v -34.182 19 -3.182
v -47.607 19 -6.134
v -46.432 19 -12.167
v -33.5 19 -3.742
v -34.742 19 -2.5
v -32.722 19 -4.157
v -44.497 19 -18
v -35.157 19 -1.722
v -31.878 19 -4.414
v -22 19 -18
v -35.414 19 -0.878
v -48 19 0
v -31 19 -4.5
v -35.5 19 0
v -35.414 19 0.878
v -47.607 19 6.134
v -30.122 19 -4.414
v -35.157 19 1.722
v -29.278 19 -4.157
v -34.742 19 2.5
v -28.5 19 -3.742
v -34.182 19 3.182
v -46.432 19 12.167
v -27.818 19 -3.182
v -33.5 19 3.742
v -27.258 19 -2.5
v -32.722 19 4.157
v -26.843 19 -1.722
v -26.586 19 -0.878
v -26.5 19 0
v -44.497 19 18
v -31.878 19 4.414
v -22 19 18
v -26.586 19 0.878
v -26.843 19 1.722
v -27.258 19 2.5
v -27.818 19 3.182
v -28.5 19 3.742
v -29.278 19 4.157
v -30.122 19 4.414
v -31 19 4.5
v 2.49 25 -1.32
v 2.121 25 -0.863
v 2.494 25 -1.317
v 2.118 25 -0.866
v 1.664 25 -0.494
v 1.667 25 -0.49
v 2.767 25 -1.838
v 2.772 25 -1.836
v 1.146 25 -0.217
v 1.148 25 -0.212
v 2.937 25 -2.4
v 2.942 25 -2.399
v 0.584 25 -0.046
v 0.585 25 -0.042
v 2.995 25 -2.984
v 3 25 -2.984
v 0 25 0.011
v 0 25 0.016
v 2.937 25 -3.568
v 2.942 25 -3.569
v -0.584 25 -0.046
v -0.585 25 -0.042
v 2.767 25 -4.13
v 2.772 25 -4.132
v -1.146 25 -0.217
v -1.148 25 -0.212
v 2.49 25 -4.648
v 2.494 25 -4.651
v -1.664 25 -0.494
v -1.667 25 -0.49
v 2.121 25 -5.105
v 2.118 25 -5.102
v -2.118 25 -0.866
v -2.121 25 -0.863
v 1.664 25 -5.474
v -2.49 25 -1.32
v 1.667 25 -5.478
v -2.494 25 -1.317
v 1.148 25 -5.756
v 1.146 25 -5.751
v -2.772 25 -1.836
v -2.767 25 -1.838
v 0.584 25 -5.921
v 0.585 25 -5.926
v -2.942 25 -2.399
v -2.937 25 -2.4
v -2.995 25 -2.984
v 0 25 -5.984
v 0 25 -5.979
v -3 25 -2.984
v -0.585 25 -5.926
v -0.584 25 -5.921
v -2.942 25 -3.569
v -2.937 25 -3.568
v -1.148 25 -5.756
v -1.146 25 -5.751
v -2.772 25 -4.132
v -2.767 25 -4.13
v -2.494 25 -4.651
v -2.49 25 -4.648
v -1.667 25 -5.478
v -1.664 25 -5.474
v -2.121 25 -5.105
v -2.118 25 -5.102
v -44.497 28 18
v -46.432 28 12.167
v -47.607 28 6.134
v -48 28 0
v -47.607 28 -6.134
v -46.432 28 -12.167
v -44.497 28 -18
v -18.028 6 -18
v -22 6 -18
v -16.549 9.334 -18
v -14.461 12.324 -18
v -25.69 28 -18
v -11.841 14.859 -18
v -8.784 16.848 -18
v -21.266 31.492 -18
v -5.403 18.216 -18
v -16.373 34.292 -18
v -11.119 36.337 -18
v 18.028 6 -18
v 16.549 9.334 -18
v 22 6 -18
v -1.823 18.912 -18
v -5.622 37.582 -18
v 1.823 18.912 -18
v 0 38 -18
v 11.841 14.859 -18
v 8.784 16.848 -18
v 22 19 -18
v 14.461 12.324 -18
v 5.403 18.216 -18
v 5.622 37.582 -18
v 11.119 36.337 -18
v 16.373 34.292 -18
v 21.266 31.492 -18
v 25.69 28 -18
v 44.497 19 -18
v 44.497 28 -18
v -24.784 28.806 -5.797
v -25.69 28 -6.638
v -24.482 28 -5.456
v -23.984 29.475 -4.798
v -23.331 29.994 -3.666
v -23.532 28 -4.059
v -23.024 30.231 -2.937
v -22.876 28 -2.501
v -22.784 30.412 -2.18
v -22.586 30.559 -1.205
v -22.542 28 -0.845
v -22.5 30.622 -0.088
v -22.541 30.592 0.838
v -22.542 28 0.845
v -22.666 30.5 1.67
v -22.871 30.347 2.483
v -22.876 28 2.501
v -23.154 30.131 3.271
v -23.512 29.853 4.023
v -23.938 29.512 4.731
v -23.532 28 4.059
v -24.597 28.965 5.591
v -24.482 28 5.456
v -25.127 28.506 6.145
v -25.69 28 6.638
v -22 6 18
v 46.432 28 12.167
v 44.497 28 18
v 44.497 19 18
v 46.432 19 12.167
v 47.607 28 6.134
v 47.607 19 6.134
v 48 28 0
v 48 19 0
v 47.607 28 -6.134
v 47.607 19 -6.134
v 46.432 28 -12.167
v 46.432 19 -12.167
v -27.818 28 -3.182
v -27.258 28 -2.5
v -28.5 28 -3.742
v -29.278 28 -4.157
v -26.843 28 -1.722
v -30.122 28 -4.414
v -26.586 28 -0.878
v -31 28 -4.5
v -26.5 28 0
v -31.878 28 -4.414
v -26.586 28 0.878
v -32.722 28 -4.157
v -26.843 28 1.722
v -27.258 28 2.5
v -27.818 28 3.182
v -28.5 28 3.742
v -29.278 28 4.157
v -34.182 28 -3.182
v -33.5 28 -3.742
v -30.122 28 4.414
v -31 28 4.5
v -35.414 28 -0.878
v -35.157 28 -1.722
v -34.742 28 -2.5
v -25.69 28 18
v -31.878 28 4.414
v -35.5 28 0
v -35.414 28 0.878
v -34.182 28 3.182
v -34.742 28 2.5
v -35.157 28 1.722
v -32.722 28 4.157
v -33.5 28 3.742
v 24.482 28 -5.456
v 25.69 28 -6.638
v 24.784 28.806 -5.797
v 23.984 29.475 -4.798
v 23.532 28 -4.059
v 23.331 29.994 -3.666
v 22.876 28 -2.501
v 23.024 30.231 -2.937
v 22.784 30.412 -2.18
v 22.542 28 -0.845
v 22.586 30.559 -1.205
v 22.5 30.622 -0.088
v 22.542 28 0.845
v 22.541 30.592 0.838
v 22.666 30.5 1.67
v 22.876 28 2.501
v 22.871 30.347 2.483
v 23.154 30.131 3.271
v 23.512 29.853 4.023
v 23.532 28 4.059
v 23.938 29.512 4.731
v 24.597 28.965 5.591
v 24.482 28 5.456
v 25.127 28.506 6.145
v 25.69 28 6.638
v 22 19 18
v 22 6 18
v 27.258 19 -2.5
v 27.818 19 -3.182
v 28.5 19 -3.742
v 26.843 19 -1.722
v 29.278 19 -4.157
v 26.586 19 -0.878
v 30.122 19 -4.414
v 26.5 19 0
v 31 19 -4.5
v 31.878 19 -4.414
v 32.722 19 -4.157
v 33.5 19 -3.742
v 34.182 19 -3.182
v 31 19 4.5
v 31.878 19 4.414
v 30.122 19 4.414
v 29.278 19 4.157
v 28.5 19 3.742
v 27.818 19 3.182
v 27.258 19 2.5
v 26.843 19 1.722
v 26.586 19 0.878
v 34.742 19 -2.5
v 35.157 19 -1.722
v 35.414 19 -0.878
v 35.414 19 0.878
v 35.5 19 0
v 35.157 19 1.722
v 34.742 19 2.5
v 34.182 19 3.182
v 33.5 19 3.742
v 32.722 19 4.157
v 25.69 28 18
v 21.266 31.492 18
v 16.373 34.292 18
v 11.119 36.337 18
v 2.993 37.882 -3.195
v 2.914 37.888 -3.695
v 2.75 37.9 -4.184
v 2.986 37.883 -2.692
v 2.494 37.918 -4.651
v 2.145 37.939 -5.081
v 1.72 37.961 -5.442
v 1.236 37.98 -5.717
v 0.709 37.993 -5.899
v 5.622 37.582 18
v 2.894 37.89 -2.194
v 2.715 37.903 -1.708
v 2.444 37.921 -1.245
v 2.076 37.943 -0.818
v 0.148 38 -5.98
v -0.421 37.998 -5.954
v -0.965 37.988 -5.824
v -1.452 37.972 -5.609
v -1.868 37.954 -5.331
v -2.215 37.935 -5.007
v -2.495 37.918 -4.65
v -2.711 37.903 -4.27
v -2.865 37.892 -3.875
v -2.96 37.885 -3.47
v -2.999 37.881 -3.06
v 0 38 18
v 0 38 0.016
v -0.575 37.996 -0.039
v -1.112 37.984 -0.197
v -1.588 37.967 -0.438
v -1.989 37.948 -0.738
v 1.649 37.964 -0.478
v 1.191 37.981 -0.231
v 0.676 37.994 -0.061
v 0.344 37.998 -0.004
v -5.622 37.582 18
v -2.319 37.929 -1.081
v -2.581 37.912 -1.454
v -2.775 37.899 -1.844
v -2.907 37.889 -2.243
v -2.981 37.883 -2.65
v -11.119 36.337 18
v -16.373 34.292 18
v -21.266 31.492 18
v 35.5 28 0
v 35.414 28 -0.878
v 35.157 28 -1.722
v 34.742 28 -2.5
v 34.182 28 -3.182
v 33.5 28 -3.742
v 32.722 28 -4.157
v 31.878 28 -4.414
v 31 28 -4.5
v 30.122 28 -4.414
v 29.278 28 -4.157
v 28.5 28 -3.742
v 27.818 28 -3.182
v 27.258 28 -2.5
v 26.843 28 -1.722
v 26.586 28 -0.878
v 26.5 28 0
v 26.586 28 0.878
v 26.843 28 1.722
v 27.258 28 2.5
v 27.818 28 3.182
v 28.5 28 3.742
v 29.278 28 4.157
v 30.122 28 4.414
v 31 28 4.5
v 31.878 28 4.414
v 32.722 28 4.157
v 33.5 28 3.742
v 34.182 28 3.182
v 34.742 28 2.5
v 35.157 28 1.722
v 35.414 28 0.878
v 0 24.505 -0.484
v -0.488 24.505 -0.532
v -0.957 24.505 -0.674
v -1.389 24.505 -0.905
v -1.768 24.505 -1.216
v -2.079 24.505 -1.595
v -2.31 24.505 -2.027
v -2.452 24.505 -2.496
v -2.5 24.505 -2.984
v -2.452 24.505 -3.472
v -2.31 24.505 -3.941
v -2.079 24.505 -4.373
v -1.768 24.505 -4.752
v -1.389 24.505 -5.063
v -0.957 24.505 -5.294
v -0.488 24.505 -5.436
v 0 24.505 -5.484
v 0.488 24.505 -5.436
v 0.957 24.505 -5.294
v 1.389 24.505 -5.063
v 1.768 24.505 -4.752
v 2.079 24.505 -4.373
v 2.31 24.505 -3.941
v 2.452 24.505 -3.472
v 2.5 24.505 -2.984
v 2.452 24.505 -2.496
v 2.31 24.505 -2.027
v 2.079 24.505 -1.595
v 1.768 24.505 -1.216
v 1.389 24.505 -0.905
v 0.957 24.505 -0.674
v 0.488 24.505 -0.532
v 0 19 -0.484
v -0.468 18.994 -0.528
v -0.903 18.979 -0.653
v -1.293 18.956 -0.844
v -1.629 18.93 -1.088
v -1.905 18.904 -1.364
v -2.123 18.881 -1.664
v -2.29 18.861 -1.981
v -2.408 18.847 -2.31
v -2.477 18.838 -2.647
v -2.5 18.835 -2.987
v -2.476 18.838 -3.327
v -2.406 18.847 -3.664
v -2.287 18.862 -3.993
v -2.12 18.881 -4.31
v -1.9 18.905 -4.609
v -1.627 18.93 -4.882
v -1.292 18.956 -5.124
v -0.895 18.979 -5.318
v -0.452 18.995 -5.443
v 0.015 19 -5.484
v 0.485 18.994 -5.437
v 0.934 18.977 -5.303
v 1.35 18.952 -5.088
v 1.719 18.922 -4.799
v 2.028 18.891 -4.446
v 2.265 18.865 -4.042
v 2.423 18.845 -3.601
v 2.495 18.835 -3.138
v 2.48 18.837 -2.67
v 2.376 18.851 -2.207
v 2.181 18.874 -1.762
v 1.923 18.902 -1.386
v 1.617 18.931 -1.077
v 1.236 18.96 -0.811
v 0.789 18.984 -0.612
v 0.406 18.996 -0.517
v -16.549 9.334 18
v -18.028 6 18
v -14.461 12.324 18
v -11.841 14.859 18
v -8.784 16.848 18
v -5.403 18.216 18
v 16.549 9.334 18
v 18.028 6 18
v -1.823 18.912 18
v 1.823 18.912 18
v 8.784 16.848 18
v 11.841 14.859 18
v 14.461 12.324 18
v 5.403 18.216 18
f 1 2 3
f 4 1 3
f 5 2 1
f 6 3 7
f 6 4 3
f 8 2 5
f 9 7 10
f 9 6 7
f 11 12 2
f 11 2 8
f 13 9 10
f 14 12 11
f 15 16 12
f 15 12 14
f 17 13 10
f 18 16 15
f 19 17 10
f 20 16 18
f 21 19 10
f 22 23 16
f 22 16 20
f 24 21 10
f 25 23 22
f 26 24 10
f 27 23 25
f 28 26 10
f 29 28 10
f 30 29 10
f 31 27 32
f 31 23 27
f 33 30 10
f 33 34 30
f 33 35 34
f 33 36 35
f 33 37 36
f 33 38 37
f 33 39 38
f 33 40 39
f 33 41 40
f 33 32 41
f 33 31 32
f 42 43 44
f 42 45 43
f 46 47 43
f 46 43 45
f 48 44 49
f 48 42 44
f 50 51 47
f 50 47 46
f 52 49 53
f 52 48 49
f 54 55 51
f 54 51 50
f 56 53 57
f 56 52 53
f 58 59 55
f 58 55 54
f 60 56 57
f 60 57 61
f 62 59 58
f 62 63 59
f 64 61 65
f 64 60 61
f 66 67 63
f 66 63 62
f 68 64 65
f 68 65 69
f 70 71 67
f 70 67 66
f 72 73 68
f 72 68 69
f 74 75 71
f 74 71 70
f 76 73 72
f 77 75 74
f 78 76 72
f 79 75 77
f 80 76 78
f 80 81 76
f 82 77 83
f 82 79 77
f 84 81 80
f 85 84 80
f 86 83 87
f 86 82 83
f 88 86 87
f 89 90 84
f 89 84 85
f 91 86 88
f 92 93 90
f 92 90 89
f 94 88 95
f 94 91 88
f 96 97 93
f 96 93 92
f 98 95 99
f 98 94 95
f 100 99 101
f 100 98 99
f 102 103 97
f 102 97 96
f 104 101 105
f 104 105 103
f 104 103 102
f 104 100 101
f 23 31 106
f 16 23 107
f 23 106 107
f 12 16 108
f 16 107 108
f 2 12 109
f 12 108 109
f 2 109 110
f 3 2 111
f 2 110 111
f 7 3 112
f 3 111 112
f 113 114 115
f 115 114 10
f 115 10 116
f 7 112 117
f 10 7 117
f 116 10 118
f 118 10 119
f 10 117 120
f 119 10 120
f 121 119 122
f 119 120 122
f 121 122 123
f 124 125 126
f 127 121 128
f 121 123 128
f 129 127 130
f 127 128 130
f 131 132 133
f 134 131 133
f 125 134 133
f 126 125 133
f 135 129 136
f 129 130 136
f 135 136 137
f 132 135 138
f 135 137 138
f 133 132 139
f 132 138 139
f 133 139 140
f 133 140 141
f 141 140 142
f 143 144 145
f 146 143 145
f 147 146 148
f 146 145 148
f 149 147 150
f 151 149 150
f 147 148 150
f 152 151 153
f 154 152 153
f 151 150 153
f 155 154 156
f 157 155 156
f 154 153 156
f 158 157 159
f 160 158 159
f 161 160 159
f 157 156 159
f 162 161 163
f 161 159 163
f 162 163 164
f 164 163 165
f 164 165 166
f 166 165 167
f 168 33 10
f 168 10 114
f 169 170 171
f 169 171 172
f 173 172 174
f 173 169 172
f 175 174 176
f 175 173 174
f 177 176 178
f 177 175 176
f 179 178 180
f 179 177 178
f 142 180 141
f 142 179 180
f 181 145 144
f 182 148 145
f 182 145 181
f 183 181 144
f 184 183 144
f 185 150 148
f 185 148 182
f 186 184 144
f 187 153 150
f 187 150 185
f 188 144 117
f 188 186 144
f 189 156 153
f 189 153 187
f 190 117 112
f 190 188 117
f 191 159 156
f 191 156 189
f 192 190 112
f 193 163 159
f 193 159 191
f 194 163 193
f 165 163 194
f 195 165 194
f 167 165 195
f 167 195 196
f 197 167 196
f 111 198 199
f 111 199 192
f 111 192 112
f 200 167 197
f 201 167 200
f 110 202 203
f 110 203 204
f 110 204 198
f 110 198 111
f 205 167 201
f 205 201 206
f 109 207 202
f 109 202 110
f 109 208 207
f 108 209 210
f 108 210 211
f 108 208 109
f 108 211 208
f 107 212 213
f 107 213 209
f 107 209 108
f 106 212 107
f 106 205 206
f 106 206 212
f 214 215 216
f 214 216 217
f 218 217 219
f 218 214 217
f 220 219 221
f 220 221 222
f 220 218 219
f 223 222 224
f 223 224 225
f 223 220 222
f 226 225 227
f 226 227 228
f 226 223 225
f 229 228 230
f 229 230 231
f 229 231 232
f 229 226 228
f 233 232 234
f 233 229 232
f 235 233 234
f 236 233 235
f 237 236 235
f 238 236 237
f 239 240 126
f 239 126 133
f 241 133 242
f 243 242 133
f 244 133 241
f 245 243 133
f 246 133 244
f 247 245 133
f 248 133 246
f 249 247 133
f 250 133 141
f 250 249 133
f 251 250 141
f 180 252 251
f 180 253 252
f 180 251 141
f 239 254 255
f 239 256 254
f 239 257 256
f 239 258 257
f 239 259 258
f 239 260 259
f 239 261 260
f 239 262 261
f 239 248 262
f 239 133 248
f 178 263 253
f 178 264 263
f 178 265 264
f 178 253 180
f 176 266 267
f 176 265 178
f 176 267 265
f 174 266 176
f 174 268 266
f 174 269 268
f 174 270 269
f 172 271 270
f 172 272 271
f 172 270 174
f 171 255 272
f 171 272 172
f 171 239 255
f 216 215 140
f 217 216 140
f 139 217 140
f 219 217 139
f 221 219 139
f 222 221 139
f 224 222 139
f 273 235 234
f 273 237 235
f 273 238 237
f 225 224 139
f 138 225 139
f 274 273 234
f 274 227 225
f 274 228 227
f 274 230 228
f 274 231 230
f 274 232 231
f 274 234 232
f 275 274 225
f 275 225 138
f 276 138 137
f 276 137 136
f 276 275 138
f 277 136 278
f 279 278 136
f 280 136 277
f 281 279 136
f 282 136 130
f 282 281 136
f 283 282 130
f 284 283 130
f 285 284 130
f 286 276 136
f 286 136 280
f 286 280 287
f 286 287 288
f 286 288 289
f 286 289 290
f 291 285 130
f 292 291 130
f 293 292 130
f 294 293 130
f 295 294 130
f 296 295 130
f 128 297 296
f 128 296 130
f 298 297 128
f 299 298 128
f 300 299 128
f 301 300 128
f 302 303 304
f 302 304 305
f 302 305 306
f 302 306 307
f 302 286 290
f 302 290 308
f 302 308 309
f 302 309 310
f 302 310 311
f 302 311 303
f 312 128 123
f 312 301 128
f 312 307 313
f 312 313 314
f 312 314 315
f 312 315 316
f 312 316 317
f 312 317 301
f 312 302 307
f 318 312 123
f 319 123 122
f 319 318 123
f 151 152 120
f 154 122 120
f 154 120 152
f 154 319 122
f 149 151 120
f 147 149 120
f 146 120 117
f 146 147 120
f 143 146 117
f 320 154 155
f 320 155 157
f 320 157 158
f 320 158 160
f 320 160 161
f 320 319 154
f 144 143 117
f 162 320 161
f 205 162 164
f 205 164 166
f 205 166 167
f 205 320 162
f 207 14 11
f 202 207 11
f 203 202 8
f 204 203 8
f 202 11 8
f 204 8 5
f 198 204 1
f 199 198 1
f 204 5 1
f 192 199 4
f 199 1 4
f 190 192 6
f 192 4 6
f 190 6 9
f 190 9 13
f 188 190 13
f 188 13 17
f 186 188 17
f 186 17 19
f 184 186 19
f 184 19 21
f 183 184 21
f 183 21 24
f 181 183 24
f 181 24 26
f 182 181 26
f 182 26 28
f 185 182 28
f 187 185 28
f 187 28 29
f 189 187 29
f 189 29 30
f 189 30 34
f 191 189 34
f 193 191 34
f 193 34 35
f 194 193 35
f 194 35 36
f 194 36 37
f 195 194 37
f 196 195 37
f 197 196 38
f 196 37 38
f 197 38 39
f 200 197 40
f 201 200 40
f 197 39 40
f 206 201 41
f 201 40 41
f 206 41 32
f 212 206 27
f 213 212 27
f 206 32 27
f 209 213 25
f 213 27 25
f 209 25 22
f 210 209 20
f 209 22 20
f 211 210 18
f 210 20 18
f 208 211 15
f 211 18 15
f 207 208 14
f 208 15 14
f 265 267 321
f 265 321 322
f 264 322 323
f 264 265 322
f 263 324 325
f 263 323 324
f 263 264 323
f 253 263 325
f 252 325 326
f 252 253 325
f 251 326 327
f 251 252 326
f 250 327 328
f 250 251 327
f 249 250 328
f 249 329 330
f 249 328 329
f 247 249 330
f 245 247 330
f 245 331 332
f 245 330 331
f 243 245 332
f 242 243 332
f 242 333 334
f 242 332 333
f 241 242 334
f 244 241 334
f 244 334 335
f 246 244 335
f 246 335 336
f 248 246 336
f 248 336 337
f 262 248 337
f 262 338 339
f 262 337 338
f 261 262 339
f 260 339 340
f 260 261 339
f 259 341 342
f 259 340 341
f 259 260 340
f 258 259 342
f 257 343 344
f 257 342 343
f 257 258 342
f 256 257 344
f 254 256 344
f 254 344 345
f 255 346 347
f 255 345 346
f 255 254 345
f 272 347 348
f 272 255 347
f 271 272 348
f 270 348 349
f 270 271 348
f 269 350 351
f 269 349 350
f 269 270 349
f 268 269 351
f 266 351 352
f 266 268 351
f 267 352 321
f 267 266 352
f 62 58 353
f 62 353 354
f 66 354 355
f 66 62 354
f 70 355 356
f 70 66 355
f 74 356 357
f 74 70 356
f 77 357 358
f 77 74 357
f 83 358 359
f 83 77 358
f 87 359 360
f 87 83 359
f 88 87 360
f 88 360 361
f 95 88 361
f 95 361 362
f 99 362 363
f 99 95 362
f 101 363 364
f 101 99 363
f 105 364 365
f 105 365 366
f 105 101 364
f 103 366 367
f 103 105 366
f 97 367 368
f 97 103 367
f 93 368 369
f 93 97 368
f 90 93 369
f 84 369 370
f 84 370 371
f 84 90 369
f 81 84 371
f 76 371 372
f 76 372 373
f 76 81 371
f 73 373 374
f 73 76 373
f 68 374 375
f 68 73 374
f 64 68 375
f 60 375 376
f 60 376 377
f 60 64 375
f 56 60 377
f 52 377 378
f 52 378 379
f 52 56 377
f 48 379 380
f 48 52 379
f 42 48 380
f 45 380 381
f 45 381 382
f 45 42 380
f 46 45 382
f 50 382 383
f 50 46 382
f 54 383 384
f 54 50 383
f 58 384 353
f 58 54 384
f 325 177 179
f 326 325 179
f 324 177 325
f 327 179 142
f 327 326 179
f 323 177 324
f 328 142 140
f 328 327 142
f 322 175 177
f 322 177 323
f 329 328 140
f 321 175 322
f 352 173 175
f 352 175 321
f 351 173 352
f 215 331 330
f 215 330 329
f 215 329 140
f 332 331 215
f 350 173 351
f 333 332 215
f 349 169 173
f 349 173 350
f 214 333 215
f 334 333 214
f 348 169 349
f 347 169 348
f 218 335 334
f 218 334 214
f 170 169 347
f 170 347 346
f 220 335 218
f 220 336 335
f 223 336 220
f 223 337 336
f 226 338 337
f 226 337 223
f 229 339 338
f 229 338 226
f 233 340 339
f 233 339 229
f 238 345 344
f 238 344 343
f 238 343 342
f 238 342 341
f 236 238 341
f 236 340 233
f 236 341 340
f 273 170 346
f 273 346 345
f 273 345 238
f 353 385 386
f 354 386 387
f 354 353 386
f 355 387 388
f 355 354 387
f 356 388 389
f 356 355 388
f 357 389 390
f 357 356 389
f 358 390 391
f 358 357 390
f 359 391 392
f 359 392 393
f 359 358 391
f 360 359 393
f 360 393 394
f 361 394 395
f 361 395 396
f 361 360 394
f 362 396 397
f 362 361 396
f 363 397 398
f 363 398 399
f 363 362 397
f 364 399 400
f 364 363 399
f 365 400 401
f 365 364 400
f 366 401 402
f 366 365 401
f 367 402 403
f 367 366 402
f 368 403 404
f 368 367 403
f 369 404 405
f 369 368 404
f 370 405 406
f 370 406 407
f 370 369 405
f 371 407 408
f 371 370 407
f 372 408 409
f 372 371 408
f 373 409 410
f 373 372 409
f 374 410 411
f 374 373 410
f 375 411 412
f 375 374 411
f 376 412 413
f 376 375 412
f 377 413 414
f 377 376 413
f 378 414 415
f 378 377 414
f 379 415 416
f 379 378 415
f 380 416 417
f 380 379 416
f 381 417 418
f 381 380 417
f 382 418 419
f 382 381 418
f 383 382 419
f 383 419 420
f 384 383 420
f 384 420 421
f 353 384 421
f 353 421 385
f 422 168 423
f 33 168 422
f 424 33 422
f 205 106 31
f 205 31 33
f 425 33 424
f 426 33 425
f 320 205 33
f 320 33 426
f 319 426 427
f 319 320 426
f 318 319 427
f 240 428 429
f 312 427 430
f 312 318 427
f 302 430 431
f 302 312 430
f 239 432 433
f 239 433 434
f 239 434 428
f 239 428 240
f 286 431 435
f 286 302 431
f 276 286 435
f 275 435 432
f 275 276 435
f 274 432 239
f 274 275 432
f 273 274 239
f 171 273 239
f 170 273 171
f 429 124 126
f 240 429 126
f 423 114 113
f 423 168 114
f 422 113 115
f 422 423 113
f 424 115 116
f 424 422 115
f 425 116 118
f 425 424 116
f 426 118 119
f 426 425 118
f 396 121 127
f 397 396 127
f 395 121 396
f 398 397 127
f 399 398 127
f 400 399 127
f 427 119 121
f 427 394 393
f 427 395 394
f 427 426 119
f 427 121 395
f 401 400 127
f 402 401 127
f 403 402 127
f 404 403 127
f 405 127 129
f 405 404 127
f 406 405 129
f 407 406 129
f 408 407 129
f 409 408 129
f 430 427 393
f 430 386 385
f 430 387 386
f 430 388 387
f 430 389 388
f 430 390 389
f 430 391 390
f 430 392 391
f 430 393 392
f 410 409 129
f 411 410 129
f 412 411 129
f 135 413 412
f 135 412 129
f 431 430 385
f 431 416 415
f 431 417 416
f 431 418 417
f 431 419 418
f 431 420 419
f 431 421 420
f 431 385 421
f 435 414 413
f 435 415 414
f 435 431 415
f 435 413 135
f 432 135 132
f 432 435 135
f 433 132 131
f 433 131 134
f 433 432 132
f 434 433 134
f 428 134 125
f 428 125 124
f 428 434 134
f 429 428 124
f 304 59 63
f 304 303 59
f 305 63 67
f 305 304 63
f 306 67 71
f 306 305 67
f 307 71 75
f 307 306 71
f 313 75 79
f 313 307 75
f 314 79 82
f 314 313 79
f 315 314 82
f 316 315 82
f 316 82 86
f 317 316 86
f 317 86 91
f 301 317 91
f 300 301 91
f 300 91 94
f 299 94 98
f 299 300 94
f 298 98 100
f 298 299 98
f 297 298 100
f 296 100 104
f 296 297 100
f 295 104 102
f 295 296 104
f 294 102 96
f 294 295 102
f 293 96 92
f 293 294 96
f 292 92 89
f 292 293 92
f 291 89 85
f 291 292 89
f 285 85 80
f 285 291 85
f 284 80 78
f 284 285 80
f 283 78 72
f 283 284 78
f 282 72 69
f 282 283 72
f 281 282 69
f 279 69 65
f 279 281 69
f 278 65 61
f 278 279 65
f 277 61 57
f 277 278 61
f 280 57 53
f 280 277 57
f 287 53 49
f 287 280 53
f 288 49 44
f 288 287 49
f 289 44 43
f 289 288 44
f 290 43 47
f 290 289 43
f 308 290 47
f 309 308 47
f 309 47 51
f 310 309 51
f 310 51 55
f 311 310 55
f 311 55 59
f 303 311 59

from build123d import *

# Parameters (mm, degrees)
BOSS_EXTRUDE1_DEPTH    = 18
CUT_EXTRUDE1_DEPTH     = 23
F_12_0MM_DOWEL_HOLE3_D = 9
CUT_EXTRUDE5_DEPTH     = 36


with BuildPart() as part:
    # Sketch1 → Boss-Extrude1 (new body, symmetric)
    with BuildSketch(Plane.XY):
        with BuildLine():
            Line((18.027756377, 6), (22, 6))
            Line((22, 6), (22, 19))
            Line((22, 19), (50, 19))
            Line((50, 19), (50, 28))
            Line((50, 28), (25.690465157, 28))
            ThreePointArc((25.690465157, 28), (0, 38), (-25.690465157, 28))
            Line((-25.690465157, 28), (-50, 28))
            Line((-50, 28), (-50, 19))
            Line((-50, 19), (-22, 19))
            Line((-22, 19), (-22, 6))
            Line((-22, 6), (-18.027756377, 6))
            ThreePointArc((-18.027756377, 6), (0, 19), (18.027756377, 6))
        make_face()
    extrude(amount=BOSS_EXTRUDE1_DEPTH, both=True)

    # Sketch3 → Cut-Extrude1 (cut, through all)
    with BuildSketch(Plane(origin=(0, 28, 0), x_dir=(1, 0, 0), z_dir=(0, 1, 0))):
        with BuildLine():
            Line((-44.497190923, 18), (-50, 18))
            Line((-50, 18), (-50, -18))
            Line((-50, -18), (-44.497190923, -18))
            ThreePointArc((-44.497190923, -18), (-48, 0), (-44.497190923, 18))
        make_face()
    cut_extrude1 = extrude(amount=-CUT_EXTRUDE1_DEPTH, mode=Mode.SUBTRACT)

    # Ø12.0mm Dowel Hole3 (through all)
    with Locations(Plane(origin=(0, 28, 0), x_dir=(1, 0, 0), z_dir=(0, 1, 0))):
        with Locations((-31, 0)):
            f_12_0mm_dowel_hole3 = Hole(F_12_0MM_DOWEL_HOLE3_D / 2)

    # Sketch17 → Cut-Extrude5 (cut)
    with BuildSketch(Plane(origin=(0, 28, 0), x_dir=(1, 0, 0), z_dir=(0, 1, 0))):
        with BuildLine():
            Line((-25.690465157, -6.637683312), (-25.690465157, 6.637683312))
            ThreePointArc((-25.690465157, 6.637683312), (-22.5, 0), (-25.690465157, -6.637683312))
        make_face()
    cut_extrude5 = extrude(amount=CUT_EXTRUDE5_DEPTH, mode=Mode.SUBTRACT)

    # Sketch20 → CBORE for M6 Hex Head Bolt1 (revolve, cut)
    with BuildSketch(Plane(origin=(0, 38, -2.983943356), x_dir=(0, 0, 1), z_dir=(1, 0, 0))):
        Polygon((0, 0), (0, 32), (2.5, 32), (2.5, 13.495), (2.995, 13), (3, 13), (3, 0), align=None)
    cbore_for_m6_hex_head_bolt1 = revolve(axis=Axis((0, 44.35, -2.983943356), (0, -1, 0)), mode=Mode.SUBTRACT)

    # Mirror1: Cut-Extrude1, Ø12.0mm Dowel Hole3, Cut-Extrude5, CBORE for M6 Hex Head Bolt1 across plane
    add(cut_extrude1.mirror(Plane(origin=(0, 0, 0), x_dir=(0, 0, 1), z_dir=(1, 0, 0))), mode=Mode.SUBTRACT)
    add(f_12_0mm_dowel_hole3.mirror(Plane(origin=(0, 0, 0), x_dir=(0, 0, 1), z_dir=(1, 0, 0))), mode=Mode.SUBTRACT)
    add(cut_extrude5.mirror(Plane(origin=(0, 0, 0), x_dir=(0, 0, 1), z_dir=(1, 0, 0))), mode=Mode.SUBTRACT)
    add(cbore_for_m6_hex_head_bolt1.mirror(Plane(origin=(0, 0, 0), x_dir=(0, 0, 1), z_dir=(1, 0, 0))), mode=Mode.SUBTRACT)


solid = part.part
